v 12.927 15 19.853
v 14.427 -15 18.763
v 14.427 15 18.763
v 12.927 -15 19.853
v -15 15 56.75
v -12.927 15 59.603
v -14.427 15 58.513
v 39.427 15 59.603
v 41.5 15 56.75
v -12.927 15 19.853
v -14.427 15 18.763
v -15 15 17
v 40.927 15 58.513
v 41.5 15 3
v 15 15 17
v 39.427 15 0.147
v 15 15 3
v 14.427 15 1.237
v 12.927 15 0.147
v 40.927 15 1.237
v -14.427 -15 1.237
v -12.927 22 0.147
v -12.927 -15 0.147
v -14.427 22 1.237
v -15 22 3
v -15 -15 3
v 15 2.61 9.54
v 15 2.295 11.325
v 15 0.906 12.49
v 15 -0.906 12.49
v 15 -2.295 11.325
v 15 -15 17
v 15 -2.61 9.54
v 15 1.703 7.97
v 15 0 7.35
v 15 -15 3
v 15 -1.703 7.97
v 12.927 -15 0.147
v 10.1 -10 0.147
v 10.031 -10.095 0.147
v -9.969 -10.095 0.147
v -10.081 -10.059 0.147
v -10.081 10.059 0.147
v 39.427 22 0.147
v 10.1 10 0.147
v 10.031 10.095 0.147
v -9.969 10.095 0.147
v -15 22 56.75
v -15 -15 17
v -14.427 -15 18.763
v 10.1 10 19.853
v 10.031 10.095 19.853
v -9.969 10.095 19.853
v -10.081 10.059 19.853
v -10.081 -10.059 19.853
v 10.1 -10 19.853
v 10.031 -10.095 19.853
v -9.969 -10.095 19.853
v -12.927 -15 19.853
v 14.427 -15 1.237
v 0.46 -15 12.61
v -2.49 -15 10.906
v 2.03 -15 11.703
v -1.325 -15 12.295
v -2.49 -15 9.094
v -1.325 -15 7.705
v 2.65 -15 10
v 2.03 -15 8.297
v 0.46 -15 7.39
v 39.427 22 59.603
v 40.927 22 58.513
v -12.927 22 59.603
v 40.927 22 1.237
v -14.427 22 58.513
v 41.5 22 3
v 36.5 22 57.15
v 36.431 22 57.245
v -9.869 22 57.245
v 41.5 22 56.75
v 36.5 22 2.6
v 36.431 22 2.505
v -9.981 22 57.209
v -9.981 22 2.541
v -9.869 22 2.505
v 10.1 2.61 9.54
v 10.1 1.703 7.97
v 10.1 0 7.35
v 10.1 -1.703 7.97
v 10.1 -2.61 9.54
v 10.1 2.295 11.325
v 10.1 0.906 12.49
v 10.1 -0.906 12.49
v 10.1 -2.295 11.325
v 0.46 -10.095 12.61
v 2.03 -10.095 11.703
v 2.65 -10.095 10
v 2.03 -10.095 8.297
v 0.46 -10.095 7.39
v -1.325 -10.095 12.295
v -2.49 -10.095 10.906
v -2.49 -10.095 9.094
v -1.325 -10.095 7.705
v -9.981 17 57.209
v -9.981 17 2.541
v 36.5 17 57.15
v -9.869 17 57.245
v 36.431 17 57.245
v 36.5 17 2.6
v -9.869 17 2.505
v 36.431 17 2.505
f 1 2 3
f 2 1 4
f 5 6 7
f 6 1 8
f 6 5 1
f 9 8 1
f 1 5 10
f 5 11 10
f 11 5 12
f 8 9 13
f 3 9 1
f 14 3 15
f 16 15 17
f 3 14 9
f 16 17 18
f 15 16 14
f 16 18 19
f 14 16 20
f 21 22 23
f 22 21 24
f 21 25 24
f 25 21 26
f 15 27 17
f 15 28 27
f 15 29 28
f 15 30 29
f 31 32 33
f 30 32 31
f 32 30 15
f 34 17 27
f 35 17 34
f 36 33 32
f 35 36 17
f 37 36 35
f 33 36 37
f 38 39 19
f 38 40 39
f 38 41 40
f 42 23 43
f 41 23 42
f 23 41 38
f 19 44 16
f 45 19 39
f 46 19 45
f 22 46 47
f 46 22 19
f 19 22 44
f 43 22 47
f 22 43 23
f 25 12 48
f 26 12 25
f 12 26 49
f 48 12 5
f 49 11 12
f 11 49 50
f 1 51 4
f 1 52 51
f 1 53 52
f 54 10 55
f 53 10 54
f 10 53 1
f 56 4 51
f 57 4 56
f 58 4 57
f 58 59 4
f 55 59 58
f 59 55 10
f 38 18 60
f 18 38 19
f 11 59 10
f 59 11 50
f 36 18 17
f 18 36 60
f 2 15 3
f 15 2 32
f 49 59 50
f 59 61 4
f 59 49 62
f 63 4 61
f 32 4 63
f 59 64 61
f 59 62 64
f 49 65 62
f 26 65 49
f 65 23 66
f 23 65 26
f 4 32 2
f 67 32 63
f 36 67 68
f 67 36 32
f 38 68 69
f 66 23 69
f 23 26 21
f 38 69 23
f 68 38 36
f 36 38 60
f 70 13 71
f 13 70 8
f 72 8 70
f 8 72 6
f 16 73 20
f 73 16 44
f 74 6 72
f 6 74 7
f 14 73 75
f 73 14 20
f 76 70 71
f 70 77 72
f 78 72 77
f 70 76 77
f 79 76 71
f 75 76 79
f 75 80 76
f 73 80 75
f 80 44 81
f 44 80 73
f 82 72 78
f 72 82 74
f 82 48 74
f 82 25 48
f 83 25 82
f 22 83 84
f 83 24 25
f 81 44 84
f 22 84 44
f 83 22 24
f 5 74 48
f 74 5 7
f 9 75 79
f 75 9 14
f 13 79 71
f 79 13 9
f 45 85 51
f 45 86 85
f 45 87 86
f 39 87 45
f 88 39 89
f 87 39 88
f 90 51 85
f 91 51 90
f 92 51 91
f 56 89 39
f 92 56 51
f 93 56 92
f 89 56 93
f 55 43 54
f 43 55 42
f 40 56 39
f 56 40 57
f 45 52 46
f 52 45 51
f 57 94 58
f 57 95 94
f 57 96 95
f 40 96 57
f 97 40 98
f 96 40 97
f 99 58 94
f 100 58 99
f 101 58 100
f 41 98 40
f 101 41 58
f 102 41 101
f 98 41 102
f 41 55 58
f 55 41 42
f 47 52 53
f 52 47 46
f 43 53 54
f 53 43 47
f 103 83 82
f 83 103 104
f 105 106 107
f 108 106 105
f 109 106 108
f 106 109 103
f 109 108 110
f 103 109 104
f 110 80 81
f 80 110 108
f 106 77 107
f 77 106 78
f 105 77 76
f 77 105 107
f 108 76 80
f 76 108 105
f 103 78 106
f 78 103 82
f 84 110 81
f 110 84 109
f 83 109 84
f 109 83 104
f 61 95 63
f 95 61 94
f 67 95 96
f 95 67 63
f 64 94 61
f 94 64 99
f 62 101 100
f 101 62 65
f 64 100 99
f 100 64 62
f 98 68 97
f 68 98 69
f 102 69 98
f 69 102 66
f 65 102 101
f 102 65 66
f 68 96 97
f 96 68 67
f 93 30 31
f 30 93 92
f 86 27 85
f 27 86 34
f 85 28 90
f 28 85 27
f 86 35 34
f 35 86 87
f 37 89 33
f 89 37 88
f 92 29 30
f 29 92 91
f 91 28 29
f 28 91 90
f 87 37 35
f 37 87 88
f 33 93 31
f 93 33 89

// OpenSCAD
// file: parameter.scad
//-------Parameter GHarp----------------------------------------------------

strScale=650;
strDia=3;
strPosX=20;
strPosY=-20;
slotXY=20;
nStr=3;

nema17_height=40;
nema17_width=42;
nema17_shftDia=5;
nema17_shftLen=28;
nema17_holeDist=31;
Nema17_gearDia=23;

tuner_bDi=7.8;
tuner_bDo=22.2;
tuner_bZ=10;
tuner_rThick=5;
//tuner_tDia=strPosX*2; (big)
tuner_tDia=strPosX*2-10;
tuner_leverZ=10;
tuner_zPos=225;
tuner_strDia=strDia[0];
tuner_leverY=35;

//----------Kickup----------------------------------------------------

kickup_baseX=17;
kickup_baseY=13;
kickup_zAdjDia=3.3;
kickup_zAdjL=10;
kickup_zAdjDist=10.5;
kickup_zAdjOff=4;
//------------------------------------------------------------------------

slide_cpDst=1.5;
slide_rackPosX=(55-12.5);

m3Dia=3.3;
m3NutD=6.6;
m4Dia=4.3;
m4NutD=8.3;
m4NutZ=5;
m5Dia=5.3;
m5HeadD=9.6;

edgeR=3;

gearXPos=57;
gearYPos=0;
gearZPos=360;

rackScrD=20;
rack_X=13;
rack_Y=15.5;
rack_extOffX=0;

bearGearD=25;
mntGrD=20.5; //mount gear distance

mnt_pcbA_X=157;
mnt_pcbA_Y=101;

//---------End Parameter GHarp-----------------------------------------------


////-------Parameter Bass----------------------------------------------------

//strScale=650;
//strDia=4;
//strPosX=20;
//strPosY=-20;
//slotXY=20;
//
//nema17_height=40;
//nema17_width=42;
//nema17_shftDia=5;
//nema17_shftLen=28;
//nema17_holeDist=31;
//Nema17_gearDia=23;
//
//tuner_bDi=7.8;
//tuner_bDo=22.2;
//tuner_bZ=10;
//tuner_rThick=5;
////tuner_tDia=strPosX*2; (big)
//tuner_tDia=strPosX*2-10;
//tuner_leverZ=10;
//tuner_zPos=225;
//tuner_strDia=strDia[0];
//tuner_leverY=35;
//
////----------Kickup----------------------------------------------------
//
//
//kickup_baseX=22;
//kickup_baseY=15;
//kickup_zAdjDia=3.3;
//kickup_zAdjL=10;
//kickup_zAdjDist=13;
//kickup_zAdjOff=4;
//
//
//slide_cpDst=1.5;
//slide_rackPosX=(55-12.5);
//
//m3NutD=6.6;
//m4Dia=4.3;
//m4NutD=8.3;
//m5Dia=5.3;
//
//edgeR=3;
//
//gearXPos=57;
//gearYPos=0;
//gearZPos=360;
//
//rackScrD=20;
//rack_X=13;
//rack_Y=15.5;
//rack_extOffX=0;
//
//bearGearD=25;
//mntGrD=20.5; //mount gear distance
////
//////---------End Bass-----------------------------------------------
// file: libs/rcube.scad
module rcube(size,radius){
linear_extrude(height=size[2])
if(radius>0){
hull()
{
    // place 4 circles in the corners, with the given radius
    translate([(-size[0]/2)+(radius), (-size[1]/2)+(radius), 0])
    circle(r=radius);

    translate([(size[0]/2)-(radius), (-size[1]/2)+(radius), 0])
    circle(r=radius);

    translate([(-size[0]/2)+(radius), (size[1]/2)-(radius), 0])
    circle(r=radius);

    translate([(size[0]/2)-(radius), (size[1]/2)-(radius), 0])
    circle(r=radius);
}
}
if(radius==0){
translate([0,0,size[2]/2])cube(size,center=true);
}
}
// main file
include <libs/rcube.scad>;
include <parameter.scad>;

pcbMntB();

module pcbMntB(){
srvX=20.5;
srvY=41;
srvYO=8;
wthick=5;
srvSltD=2;
cblX=5.5;
m3Dia=3;
m4Dia=4.3;
m5Dia=5.3;
scrSDst=4.5;
scrDst=10;
t=0.2;
sltPcbD=5;
  

mntZ=slotXY;
mntY=slotXY+wthick+sltPcbD;
mntX=slotXY+wthick*2;
    
pcbX=46.5;
pcbZ=54.75;
pcbY=5;

pcbMX=pcbX+wthick*2;
pcbMZ=pcbZ+wthick;
pcbMY=pcbY+2;

edgeR=3;

connZ=10;


difference(){
    union(){
    translate([mntX/2-slotXY/2-wthick,mntY/2+(sltPcbD-wthick)/2,mntZ/2])rotate([90,0,0])rcube([mntX,mntZ,mntY],edgeR);
    translate([pcbMX/2-slotXY/2-wthick,slotXY/2+pcbMY+sltPcbD,pcbMZ/2])rotate([90,0,0])rcube([pcbMX,pcbMZ,pcbMY],edgeR);
        }
    translate([mntX/2-slotXY/2-wthick,0,-1])rotate([0,0,0])rcube([slotXY+t,slotXY+t,mntZ*2],0.1);
    translate([pcbMX/2-slotXY/2-wthick,slotXY/2+pcbMY*2-pcbY+sltPcbD,pcbMZ/2])rotate([90,0,0])rcube([pcbX,pcbZ,pcbMY],0.1);
    translate([0,0,mntZ/2])rotate([90,0,0])cylinder(d=m5Dia,h=slotXY);
    translate([0,0,mntZ/2])rotate([0,90,0])cylinder(d=m5Dia,h=slotXY);
        }
}
